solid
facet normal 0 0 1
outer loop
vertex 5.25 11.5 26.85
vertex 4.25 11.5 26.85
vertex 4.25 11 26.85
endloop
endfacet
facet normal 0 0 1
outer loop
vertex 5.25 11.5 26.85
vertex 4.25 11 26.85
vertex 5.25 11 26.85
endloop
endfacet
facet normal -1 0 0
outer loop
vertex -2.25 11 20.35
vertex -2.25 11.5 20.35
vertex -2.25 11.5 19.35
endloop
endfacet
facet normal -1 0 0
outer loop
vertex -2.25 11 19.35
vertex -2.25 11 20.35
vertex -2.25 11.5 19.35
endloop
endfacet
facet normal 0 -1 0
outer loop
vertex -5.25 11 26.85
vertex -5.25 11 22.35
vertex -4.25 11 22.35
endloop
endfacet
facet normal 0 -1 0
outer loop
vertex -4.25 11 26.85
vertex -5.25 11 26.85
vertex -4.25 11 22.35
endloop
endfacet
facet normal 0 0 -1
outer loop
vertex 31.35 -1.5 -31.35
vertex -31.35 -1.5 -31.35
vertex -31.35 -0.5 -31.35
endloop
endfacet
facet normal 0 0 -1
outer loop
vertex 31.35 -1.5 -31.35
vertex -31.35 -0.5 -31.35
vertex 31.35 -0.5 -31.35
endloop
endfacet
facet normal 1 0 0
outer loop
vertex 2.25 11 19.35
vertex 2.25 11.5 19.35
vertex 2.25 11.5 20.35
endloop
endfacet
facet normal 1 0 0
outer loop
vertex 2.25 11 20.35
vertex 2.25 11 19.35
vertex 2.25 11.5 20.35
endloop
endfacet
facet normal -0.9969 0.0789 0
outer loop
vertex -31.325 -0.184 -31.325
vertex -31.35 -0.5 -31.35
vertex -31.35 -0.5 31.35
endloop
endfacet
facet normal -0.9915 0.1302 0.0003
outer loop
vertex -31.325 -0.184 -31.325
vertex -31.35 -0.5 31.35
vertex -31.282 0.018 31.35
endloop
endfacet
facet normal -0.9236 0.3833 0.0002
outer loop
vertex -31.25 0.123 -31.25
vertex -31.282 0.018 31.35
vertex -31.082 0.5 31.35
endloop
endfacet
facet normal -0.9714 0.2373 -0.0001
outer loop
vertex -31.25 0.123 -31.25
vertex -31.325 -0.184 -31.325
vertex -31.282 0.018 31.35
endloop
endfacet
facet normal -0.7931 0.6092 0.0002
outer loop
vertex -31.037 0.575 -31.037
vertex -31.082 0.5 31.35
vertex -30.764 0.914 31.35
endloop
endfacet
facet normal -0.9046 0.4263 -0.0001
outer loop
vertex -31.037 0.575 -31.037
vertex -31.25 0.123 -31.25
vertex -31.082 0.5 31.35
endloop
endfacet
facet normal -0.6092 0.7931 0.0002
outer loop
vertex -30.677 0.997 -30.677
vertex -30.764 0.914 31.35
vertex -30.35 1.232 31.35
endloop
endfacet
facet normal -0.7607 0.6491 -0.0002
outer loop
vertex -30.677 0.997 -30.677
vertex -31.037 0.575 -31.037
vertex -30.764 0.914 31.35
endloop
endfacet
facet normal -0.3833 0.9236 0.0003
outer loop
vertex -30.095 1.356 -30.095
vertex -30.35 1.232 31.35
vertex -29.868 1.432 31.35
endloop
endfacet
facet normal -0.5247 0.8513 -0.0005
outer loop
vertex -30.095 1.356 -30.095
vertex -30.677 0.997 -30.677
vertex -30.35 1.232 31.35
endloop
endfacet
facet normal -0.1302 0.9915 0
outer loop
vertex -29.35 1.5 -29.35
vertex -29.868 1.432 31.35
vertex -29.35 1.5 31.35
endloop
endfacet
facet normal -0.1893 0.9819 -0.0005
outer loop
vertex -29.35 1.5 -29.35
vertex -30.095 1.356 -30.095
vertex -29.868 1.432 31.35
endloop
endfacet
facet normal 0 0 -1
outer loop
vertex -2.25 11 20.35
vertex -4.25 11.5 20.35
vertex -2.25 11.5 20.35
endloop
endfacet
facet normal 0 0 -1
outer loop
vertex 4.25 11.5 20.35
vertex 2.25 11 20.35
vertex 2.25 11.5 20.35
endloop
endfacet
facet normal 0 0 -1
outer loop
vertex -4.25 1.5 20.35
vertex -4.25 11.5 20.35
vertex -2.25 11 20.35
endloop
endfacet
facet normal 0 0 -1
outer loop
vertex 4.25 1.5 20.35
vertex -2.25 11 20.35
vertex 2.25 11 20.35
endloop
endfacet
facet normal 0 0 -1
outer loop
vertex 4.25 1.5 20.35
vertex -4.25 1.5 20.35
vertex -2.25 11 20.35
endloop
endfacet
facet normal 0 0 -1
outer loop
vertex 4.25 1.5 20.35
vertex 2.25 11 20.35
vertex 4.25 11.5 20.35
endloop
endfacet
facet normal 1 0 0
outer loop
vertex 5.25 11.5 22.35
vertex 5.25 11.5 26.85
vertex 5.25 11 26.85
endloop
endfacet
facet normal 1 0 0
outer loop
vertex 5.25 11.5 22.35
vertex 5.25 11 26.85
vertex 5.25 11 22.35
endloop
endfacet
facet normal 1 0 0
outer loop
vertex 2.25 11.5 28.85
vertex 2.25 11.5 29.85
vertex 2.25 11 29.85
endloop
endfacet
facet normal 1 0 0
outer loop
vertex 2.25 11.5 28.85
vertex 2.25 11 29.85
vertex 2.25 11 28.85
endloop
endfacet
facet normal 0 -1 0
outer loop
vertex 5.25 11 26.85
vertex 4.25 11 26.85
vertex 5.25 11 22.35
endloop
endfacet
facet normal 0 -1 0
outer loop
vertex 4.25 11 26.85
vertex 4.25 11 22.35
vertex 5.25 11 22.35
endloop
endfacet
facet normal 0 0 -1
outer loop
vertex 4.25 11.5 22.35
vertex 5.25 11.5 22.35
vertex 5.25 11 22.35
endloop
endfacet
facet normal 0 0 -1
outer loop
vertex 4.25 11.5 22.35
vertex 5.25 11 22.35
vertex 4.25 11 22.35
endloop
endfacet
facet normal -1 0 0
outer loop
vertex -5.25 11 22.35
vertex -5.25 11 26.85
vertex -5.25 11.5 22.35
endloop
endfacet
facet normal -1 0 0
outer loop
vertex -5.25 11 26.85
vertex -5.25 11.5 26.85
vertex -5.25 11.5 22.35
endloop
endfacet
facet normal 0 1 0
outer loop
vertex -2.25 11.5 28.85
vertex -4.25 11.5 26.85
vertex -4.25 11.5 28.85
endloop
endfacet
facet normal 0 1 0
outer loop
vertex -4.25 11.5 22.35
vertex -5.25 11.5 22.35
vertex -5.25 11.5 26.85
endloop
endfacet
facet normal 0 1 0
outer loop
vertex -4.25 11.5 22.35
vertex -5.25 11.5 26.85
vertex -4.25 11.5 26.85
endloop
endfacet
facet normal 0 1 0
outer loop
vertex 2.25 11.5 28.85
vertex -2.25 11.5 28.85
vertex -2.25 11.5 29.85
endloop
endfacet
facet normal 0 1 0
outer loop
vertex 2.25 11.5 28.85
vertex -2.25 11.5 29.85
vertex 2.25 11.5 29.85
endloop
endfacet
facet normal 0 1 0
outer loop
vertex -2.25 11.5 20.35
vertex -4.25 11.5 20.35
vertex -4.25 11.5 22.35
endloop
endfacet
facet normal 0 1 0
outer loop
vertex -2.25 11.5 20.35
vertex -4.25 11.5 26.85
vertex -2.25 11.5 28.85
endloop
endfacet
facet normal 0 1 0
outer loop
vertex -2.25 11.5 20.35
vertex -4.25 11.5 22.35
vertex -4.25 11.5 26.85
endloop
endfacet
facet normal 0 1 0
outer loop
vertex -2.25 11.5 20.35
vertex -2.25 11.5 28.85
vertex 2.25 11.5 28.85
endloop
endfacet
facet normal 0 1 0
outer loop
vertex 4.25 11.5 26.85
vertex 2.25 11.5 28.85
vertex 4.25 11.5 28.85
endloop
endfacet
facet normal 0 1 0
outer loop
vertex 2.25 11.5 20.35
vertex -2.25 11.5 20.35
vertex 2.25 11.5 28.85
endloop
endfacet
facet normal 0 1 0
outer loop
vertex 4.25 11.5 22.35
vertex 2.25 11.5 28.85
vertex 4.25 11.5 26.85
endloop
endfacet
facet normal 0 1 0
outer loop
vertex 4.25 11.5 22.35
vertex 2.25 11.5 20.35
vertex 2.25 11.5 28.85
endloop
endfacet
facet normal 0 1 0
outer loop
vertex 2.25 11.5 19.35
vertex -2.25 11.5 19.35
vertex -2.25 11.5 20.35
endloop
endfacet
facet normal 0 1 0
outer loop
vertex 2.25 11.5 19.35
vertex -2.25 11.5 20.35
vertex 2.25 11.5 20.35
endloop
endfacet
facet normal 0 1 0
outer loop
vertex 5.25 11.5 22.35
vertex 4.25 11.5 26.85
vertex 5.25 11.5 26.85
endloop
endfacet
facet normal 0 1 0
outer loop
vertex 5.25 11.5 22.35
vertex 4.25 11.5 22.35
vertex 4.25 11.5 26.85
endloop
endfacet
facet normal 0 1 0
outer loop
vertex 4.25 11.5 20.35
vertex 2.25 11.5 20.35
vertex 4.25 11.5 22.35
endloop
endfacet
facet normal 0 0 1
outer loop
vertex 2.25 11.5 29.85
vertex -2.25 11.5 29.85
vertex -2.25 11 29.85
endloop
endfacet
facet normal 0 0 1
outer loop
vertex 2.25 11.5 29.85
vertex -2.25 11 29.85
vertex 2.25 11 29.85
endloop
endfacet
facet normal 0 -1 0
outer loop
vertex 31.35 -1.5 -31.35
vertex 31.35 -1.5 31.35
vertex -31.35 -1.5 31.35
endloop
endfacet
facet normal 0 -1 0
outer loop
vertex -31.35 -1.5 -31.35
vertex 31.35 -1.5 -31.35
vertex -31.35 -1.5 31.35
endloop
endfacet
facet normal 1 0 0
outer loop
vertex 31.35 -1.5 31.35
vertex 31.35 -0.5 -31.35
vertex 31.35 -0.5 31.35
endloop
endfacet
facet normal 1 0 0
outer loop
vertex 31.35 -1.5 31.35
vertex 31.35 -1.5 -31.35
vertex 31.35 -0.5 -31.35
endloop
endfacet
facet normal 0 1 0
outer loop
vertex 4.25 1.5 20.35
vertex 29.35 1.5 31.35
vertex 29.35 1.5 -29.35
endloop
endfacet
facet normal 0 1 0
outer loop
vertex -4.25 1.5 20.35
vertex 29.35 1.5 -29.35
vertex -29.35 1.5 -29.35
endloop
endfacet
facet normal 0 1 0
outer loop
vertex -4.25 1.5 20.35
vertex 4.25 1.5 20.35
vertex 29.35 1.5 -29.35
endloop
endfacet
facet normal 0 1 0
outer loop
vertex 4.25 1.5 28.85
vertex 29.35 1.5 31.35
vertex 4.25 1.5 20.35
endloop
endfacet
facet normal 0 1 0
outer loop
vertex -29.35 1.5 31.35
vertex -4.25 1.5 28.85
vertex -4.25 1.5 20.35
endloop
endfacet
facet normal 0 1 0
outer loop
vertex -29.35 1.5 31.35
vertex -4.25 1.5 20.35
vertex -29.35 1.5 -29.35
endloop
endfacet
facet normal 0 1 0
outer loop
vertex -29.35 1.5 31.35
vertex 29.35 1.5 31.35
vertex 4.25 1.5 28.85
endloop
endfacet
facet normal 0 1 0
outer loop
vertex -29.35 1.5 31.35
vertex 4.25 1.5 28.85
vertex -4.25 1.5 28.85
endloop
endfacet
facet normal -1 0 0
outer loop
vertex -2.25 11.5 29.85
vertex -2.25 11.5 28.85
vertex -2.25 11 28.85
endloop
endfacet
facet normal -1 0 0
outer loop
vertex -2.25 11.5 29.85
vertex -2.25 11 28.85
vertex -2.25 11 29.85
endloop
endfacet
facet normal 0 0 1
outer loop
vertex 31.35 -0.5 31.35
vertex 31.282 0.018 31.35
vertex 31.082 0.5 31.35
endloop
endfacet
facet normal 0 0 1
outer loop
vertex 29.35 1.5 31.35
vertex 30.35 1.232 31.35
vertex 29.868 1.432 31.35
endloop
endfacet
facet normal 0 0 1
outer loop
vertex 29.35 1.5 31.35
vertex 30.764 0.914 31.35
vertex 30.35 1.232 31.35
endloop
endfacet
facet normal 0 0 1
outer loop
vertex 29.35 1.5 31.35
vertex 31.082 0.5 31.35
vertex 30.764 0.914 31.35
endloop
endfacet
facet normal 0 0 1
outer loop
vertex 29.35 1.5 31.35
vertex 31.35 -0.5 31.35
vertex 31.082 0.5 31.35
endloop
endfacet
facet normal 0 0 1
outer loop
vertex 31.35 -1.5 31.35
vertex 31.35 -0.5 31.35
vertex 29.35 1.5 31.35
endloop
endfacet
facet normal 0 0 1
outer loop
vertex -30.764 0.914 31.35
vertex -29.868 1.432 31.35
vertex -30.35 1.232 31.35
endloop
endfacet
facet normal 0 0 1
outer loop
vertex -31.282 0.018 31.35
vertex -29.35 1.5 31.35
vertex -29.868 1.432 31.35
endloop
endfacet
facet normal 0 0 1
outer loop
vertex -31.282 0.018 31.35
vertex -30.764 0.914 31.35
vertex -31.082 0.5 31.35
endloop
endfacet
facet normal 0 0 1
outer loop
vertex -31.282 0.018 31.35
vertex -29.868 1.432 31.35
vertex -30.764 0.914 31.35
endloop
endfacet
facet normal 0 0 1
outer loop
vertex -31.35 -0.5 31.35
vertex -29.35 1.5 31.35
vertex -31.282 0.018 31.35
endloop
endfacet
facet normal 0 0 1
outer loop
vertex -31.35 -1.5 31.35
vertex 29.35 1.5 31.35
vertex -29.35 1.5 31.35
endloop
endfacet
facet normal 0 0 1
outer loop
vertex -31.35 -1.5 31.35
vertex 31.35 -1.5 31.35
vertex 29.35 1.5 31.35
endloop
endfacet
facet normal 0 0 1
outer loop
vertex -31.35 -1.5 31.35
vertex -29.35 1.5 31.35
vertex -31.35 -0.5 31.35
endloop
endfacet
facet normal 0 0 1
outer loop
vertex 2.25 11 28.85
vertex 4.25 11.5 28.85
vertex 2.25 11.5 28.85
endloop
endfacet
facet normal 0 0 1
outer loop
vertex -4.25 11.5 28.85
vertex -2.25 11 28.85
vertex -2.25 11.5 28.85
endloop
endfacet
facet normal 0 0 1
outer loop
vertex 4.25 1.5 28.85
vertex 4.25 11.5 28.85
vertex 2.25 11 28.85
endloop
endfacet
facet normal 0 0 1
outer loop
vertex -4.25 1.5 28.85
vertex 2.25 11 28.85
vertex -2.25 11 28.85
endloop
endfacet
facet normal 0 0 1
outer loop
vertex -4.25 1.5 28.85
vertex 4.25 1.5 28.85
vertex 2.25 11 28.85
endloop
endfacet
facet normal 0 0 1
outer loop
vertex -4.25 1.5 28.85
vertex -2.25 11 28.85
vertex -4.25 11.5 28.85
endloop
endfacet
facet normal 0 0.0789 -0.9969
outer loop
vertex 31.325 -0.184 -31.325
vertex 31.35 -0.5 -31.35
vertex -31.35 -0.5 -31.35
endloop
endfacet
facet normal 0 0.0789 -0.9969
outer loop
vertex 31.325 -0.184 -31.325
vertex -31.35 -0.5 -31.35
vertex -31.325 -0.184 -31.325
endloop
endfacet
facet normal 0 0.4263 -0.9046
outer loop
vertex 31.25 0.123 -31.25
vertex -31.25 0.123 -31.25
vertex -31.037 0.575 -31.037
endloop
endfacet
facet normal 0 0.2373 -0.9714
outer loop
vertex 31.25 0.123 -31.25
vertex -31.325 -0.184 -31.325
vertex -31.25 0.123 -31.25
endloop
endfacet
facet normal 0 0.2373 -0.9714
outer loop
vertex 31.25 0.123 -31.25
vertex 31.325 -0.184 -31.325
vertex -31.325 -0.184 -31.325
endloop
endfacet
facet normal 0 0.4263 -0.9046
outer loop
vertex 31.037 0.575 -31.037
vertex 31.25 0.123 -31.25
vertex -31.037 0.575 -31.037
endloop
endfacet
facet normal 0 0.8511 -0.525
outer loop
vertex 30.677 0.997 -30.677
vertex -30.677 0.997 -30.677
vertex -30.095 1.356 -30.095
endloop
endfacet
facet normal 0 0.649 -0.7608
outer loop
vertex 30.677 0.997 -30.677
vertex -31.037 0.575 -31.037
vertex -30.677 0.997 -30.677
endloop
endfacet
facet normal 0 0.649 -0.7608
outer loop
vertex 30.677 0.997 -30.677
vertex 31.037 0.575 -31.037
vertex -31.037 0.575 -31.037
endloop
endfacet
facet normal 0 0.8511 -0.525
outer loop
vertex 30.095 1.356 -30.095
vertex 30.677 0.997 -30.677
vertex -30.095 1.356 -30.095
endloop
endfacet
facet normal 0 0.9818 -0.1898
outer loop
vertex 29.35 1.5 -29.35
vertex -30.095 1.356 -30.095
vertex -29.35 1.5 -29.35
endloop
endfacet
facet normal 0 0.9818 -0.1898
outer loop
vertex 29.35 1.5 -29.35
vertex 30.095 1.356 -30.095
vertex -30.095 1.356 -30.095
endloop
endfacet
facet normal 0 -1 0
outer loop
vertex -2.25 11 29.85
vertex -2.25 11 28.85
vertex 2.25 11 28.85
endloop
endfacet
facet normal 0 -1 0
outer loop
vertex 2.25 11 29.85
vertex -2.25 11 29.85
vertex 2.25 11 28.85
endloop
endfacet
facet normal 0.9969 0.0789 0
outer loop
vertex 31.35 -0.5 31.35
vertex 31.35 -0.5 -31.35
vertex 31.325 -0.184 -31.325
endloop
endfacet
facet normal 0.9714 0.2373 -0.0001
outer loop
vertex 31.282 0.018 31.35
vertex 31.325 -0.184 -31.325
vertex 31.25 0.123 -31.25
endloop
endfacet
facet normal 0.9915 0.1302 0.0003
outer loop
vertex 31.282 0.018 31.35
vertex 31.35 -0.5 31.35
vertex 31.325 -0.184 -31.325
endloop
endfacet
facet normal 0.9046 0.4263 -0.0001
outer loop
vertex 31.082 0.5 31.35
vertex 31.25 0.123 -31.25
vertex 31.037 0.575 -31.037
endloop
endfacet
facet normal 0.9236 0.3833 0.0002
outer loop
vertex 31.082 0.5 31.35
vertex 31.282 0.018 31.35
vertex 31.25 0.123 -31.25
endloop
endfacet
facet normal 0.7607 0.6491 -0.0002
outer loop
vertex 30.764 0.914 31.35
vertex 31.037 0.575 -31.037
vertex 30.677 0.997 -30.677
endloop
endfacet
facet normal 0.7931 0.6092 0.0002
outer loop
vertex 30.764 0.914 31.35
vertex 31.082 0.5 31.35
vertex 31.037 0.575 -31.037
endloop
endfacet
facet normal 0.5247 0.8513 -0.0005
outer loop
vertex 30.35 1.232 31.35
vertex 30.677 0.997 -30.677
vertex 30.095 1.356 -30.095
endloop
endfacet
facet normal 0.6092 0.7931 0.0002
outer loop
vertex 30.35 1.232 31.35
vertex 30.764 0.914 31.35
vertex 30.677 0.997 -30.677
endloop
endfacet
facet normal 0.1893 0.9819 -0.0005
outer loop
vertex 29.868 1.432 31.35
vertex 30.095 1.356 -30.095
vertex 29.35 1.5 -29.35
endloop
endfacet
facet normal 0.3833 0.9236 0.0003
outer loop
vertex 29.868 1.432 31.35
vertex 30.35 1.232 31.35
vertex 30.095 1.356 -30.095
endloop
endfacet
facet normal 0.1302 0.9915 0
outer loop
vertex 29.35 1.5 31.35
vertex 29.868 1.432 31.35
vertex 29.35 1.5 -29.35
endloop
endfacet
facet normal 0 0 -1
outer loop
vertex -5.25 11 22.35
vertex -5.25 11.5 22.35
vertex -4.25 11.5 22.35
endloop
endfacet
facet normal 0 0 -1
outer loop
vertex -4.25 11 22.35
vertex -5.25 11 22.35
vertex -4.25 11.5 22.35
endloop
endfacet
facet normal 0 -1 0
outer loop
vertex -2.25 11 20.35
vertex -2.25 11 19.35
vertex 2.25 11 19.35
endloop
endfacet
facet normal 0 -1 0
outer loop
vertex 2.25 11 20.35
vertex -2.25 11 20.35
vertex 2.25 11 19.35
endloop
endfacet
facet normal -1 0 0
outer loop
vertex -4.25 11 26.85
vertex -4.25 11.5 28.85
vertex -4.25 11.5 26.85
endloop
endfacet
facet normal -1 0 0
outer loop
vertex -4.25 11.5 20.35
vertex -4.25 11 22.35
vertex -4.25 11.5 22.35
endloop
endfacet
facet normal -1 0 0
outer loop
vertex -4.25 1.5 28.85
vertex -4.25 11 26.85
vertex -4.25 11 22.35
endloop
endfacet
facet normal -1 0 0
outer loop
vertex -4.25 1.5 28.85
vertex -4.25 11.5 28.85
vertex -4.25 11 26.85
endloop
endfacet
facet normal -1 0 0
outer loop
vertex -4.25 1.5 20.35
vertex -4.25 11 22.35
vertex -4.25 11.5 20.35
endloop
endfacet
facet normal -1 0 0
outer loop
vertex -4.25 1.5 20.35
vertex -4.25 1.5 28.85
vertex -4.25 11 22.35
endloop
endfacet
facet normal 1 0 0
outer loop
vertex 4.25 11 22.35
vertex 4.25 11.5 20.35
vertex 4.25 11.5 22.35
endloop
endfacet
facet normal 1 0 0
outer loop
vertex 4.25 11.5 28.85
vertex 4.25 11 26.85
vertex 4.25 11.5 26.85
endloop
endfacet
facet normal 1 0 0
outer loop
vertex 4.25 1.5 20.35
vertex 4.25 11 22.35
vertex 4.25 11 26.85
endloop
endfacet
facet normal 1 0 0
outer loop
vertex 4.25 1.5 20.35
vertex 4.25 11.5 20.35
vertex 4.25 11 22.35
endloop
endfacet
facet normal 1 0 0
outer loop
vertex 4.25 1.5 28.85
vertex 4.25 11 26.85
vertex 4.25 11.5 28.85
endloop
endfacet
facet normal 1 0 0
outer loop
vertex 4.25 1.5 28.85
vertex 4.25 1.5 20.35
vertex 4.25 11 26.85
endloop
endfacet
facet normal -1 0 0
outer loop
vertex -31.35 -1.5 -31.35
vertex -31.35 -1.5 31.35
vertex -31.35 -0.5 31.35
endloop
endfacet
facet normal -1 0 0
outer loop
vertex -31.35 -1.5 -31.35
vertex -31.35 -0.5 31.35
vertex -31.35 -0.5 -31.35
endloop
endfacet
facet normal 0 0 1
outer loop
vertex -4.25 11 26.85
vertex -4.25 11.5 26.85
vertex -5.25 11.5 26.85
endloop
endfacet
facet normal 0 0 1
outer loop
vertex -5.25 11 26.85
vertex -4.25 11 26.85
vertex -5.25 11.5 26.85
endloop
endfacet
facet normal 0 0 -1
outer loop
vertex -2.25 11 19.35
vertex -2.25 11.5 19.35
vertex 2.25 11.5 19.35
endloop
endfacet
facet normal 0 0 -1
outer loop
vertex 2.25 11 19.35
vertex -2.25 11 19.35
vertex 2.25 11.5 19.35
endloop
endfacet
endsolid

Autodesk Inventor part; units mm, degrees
ref_plane "YZ Plane" through (0, 0, 0) normal (1, 0, 0) x (0, 1, 0)
ref_plane "XZ Plane" through (0, 0, 0) normal (0, 1, 0) x (-1, 0, 0)
ref_plane "XY Plane" through (0, 0, 0) normal (0, 0, 1) x (1, 0, 0)
sketch "Skizze1" plane through (0, 0, 0) normal (0, 1, 0) x (-1, 0, 0)
  line L0 (-31.35, 31.35) -> (31.35, 31.35)
  line L1 (31.35, 31.35) -> (31.35, -31.35)
  line L2 (31.35, -31.35) -> (-31.35, -31.35)
  line L3 (-31.35, -31.35) -> (-31.35, 31.35)
  line L4 (-31.35, 31.35) -> (31.35, -31.35) construction
  line L5 (31.35, 31.35) -> (-31.35, -31.35) construction
  point P0 (0, 0)
  dimension "d0" = 62.7
  dimension "d1" = 62.7
extrude "Extrusion1" add sketch "Skizze1" along normal mid plane 3
sketch "Skizze2" plane through (0, 1.5, 0) normal (0, 1, 0) x (1, 0, 0)
  line L0 (-31.35, -31.35) -> (31.35, -31.35) construction
  line L1 (0, -31.35) -> (0, 0) construction
  line L2 (4.25, -28.85) -> (-4.25, -28.85)
  line L3 (-4.25, -28.85) -> (-4.25, -20.35)
  line L4 (-4.25, -20.35) -> (4.25, -20.35)
  line L5 (4.25, -20.35) -> (4.25, -28.85)
  dimension "d6" = 2.5
  dimension "d7" = 8.5
  dimension "d9" = 4.25
  dimension "d10" = 4.25
extrude "Extrusion2" add sketch "Skizze2" along normal blind 10
sketch "Skizze3" plane through (0, 11.5, 0) normal (0, 1, 0) x (1, 0, 0)
  line L0 (-4.25, -28.85) -> (-4.25, -20.35) projected
  line L1 (4.25, -20.35) -> (4.25, -28.85) projected
  line L2 (-4.25, -28.85) -> (4.25, -28.85)
  line L3 (-4.25, -26.85) -> (-5.25, -26.85)
  line L4 (4.25, -26.85) -> (5.25, -26.85)
  line L5 (-4.25, -20.35) -> (4.25, -20.35) projected
  line L6 (-2.25, -20.35) -> (-2.25, -19.35)
  line L7 (-2.25, -19.35) -> (2.25, -19.35)
  line L8 (2.25, -19.35) -> (2.25, -20.35)
  line L9 (-2.25, -28.85) -> (-2.25, -29.85)
  line L10 (-2.25, -29.85) -> (2.25, -29.85)
  line L11 (2.25, -29.85) -> (2.25, -28.85)
  line L12 (5.25, -26.85) -> (5.25, -22.35)
  line L13 (5.25, -22.35) -> (4.25, -22.35)
  line L14 (-5.25, -26.85) -> (-5.25, -22.35)
  line L15 (-5.25, -22.35) -> (-4.25, -22.35)
  point P0 (0, 0)
  dimension "d18" = 1
  dimension "d19" = 1
  dimension "d21" = 1
  dimension "d22" = 1
  dimension "d23" = 2
  dimension "d24" = 2
  dimension "d25" = 2
  dimension "d26" = 2
  dimension "d27" = 2
  dimension "d28" = 2
  dimension "d29" = 2
extrude "Extrusion3" add sketch "Skizze3" against normal blind 0.5 contours L3 L14 L15 L0 | L2 L11 L10 L9 | L6 L7 L8 L5 | L1 L13 L12 L4
fillet "Rundung1" radius 2 3 edges at (-31.35, 1.5, 0) (0, 1.5, -31.35) (31.35, 1.5, 0)
properties part number "GroundV11"
